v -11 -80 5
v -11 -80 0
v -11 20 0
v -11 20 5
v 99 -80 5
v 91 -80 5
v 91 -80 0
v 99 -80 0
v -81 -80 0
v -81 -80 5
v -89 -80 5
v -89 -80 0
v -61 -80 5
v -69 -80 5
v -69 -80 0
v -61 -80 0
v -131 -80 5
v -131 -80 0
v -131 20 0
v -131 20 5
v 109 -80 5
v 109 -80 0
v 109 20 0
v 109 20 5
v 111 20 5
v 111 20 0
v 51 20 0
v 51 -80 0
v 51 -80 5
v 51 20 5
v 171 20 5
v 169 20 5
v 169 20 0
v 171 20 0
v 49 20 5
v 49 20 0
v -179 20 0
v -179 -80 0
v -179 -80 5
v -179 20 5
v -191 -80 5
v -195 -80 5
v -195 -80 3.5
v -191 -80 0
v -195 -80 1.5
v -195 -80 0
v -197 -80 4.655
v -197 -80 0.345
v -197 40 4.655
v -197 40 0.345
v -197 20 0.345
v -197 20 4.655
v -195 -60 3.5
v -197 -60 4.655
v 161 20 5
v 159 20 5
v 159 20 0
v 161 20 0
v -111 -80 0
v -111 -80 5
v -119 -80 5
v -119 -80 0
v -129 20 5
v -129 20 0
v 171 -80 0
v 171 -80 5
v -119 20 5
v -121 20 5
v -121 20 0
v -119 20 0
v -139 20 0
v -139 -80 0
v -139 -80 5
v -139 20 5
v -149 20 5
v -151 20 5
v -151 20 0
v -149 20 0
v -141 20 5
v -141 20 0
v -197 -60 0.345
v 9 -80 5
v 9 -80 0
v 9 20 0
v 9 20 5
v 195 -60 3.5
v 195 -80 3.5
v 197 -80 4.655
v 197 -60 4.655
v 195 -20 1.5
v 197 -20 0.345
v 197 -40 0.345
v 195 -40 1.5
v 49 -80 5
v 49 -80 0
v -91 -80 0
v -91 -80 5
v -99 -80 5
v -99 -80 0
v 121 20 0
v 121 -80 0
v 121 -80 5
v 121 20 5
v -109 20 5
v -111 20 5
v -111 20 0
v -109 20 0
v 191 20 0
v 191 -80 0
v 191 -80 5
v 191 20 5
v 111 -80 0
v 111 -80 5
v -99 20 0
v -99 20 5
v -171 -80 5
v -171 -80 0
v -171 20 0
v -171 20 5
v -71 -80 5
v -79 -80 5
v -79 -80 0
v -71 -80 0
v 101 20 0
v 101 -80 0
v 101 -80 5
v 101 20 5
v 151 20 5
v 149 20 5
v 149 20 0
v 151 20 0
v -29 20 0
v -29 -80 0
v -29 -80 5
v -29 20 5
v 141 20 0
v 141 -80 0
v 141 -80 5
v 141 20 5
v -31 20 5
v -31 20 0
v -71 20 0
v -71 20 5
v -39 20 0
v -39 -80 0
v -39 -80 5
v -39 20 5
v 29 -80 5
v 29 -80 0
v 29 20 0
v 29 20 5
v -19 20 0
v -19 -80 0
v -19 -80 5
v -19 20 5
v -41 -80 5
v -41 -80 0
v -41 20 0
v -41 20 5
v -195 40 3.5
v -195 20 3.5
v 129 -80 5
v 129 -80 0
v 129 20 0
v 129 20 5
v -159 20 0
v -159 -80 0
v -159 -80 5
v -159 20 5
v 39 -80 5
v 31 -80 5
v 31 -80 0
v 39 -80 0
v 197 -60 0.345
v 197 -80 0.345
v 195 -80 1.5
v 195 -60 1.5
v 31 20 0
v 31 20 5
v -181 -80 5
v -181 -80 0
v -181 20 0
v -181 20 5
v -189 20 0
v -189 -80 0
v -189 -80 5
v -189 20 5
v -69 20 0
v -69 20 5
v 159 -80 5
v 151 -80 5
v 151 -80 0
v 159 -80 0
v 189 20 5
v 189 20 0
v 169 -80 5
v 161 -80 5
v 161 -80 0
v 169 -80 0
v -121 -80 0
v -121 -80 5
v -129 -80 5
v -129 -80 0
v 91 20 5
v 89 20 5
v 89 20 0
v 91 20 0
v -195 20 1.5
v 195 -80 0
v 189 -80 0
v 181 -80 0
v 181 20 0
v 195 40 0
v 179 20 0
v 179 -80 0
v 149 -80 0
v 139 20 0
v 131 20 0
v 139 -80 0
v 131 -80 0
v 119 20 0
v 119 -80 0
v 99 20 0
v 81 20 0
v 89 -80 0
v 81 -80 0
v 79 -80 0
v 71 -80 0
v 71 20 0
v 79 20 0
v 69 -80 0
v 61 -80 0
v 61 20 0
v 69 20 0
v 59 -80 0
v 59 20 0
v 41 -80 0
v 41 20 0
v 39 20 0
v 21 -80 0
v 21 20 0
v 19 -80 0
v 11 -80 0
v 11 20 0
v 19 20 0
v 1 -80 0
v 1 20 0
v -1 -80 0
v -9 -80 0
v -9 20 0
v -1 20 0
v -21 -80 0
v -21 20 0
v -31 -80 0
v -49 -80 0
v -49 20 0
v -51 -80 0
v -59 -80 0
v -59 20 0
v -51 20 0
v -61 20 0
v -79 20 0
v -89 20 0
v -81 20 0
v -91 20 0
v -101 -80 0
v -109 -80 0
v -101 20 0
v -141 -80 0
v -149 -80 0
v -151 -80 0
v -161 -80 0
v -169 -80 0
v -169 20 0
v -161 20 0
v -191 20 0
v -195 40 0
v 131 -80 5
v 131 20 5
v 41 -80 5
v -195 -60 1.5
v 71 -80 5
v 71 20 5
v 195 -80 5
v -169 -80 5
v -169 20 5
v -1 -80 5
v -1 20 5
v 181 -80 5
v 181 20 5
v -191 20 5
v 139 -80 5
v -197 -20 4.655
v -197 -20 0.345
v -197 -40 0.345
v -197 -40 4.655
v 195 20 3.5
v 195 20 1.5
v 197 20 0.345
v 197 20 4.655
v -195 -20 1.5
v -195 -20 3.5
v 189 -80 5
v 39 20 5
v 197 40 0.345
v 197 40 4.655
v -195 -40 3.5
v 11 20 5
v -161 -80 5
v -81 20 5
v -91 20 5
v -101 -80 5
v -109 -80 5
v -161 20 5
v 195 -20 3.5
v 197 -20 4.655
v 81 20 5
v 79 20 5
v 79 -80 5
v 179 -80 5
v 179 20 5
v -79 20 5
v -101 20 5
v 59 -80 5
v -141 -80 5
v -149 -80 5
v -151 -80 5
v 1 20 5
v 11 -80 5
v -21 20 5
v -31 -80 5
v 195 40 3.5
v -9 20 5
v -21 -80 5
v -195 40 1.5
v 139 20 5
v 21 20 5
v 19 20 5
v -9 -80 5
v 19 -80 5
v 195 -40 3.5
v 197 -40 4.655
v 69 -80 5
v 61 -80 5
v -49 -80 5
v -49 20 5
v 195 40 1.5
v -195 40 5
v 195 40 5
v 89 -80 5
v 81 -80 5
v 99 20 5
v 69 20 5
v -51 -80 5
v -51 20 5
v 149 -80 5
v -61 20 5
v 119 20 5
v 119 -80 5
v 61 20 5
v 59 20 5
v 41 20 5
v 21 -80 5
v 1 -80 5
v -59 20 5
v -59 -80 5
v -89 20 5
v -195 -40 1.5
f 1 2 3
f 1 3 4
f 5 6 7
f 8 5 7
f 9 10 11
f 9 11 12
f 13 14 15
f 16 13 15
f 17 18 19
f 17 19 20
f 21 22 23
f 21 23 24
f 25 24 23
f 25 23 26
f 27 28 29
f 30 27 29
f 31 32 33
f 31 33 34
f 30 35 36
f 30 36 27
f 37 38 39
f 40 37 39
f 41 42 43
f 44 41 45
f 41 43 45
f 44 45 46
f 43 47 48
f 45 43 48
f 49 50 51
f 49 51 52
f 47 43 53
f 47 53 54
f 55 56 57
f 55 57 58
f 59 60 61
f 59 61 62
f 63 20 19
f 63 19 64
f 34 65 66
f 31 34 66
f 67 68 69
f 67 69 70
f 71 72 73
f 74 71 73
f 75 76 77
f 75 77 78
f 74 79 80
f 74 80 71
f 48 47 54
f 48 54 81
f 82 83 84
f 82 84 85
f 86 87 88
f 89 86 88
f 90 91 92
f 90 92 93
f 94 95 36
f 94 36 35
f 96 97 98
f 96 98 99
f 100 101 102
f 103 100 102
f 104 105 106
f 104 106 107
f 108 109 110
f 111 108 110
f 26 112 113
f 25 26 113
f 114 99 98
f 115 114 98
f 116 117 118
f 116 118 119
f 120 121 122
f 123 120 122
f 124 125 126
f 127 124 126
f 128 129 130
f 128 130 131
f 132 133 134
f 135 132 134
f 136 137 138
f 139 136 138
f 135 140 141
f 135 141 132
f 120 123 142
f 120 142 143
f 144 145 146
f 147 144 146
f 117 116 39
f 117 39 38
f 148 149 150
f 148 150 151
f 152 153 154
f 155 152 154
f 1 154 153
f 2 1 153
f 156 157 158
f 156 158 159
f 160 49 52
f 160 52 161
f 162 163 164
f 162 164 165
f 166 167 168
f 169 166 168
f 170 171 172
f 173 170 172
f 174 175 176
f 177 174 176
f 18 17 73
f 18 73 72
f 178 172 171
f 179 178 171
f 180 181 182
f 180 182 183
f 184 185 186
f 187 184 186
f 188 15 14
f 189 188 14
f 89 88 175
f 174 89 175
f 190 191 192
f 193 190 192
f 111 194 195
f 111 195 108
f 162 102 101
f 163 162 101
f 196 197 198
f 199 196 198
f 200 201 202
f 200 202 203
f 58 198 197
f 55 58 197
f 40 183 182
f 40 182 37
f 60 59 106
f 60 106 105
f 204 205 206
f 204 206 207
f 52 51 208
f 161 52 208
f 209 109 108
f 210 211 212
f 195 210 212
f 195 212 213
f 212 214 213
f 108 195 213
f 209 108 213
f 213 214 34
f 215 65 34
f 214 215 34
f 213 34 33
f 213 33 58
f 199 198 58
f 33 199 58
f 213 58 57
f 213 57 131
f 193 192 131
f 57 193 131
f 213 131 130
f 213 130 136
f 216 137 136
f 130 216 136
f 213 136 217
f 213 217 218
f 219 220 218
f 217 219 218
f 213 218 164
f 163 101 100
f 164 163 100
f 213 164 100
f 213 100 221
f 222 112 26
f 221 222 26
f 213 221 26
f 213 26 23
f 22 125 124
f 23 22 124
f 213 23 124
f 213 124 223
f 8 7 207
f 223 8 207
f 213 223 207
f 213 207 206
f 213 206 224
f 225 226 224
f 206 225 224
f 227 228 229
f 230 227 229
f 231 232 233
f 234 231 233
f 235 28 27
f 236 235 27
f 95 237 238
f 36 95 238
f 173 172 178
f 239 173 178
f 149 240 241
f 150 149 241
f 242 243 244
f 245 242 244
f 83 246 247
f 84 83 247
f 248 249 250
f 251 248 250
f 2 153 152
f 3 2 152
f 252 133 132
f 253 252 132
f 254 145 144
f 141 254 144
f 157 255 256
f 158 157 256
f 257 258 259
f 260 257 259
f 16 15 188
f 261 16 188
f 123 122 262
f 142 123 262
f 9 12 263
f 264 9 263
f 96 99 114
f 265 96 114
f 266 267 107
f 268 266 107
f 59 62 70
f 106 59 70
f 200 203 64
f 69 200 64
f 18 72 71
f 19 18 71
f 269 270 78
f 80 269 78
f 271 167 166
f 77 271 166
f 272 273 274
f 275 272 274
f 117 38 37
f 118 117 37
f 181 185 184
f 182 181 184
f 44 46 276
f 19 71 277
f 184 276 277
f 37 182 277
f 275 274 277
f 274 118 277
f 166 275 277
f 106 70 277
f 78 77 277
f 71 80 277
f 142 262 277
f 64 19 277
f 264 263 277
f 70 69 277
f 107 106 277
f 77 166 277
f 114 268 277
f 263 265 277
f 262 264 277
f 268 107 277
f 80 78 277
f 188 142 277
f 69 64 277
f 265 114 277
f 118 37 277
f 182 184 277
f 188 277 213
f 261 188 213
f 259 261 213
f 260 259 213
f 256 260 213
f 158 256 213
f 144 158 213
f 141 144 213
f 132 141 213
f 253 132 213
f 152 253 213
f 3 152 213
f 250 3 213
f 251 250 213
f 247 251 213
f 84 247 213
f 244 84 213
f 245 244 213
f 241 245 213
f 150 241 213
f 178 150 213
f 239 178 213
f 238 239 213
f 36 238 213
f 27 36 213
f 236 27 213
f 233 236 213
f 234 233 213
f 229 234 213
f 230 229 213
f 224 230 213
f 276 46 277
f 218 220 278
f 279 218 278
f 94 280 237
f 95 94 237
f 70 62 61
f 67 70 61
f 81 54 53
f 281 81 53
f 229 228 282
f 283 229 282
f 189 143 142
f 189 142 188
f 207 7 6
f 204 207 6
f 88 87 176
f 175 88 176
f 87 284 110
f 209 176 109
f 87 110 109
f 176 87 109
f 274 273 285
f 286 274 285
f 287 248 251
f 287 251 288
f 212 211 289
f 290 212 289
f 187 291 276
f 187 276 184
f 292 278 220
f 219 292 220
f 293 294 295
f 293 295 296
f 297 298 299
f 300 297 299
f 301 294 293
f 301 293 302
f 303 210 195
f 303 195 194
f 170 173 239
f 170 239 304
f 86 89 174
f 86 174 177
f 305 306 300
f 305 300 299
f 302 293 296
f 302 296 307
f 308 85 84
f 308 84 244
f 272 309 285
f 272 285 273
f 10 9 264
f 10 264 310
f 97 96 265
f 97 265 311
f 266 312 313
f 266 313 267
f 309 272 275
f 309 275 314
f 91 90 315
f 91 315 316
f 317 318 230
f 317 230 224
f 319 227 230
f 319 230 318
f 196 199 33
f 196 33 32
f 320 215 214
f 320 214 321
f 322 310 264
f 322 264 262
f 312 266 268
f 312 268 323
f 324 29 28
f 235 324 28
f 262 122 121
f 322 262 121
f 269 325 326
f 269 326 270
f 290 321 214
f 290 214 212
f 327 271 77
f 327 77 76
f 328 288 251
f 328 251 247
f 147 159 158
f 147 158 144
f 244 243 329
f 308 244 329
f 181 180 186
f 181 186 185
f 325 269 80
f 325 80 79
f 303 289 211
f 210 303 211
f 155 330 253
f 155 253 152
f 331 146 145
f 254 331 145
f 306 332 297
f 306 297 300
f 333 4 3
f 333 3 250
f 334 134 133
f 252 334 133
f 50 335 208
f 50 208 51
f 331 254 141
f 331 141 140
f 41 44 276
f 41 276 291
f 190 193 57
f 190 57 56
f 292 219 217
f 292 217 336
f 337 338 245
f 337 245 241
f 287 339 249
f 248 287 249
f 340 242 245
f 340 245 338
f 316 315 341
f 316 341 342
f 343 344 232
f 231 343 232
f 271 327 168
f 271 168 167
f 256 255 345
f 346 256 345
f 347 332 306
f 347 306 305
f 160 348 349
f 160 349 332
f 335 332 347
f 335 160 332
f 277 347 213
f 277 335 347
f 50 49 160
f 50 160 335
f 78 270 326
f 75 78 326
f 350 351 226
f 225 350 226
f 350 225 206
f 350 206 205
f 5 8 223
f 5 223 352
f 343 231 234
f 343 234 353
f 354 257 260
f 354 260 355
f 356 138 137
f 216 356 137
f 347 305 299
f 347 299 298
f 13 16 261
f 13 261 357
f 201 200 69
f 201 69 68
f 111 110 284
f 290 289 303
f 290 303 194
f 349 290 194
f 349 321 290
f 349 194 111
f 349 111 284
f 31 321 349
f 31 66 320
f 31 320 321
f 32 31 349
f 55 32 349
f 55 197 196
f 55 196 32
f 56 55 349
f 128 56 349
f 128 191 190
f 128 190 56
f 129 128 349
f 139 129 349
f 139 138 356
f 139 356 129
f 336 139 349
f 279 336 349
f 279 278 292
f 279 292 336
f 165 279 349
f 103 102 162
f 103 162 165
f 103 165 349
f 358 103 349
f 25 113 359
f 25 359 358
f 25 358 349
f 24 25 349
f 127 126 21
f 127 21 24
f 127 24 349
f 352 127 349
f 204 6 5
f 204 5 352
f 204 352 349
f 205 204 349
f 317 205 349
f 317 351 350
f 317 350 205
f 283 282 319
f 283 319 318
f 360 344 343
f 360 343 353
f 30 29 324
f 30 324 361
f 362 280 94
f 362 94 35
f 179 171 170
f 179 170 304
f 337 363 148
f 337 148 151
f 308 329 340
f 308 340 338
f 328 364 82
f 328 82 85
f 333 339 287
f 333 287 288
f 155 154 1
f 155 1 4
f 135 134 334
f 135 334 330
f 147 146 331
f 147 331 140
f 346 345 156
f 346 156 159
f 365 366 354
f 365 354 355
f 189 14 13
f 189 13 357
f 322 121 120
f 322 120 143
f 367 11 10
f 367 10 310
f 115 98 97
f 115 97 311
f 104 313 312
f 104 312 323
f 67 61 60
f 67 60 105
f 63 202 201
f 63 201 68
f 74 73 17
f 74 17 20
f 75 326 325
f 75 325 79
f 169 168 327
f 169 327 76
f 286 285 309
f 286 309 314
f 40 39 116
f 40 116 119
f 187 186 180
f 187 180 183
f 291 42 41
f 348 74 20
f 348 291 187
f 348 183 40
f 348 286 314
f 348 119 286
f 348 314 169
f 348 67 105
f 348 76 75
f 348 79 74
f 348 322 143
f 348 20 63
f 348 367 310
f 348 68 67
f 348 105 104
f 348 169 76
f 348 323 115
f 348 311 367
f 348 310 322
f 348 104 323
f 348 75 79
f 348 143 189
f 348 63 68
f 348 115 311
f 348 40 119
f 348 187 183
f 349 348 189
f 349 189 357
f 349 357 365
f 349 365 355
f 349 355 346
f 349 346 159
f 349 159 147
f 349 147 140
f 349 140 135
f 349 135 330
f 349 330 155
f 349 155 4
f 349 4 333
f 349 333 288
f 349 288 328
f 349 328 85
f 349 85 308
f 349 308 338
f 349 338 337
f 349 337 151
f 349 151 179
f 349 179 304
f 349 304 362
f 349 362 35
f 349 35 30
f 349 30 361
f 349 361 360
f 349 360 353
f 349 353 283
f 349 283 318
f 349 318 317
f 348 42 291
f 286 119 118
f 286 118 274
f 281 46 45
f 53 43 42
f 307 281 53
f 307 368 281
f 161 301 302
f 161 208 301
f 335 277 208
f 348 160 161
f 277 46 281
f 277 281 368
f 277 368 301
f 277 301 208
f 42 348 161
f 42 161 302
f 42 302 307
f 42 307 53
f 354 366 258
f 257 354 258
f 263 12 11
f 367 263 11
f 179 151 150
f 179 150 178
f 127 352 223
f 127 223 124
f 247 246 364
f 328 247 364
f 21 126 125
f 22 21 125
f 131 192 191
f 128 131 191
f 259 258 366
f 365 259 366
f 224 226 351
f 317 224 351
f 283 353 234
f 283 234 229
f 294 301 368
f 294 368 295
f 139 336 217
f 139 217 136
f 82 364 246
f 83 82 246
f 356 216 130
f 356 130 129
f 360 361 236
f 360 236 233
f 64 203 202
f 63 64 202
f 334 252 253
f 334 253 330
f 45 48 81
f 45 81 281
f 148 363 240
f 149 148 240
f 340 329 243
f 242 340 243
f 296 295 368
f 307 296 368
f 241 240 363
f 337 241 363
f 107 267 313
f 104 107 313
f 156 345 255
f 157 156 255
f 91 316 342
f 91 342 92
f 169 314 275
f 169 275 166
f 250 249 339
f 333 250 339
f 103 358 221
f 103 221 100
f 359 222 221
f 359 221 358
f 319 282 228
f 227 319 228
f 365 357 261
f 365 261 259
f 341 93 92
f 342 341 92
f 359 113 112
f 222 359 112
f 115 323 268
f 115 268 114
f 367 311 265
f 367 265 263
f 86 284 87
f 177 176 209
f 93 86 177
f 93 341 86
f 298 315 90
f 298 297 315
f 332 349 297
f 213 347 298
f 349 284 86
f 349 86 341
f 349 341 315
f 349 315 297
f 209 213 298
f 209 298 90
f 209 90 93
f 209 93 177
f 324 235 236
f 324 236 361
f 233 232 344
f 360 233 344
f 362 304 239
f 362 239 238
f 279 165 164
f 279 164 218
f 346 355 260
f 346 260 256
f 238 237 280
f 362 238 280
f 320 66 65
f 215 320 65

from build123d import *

# Parameters (mm, degrees)
SKETCH_1_W          = 360
SKETCH_1_H          = 80
EXTRUDE_1_DEPTH     = 5
SKETCH_3_W          = 360
SKETCH_3_H          = 5
EXTRUDE_2_DEPTH     = 40
SKETCH_4_W          = 5
SKETCH_4_H          = 120
EXTRUDE_3_DEPTH     = 15
SKETCH_5_W          = 5
SKETCH_5_H          = 120
EXTRUDE_4_DEPTH     = 15
EXTRUDE_5_DEPTH     = 20
EXTRUDE_6_DEPTH     = 20
EXTRUDE_START       = -20
EXTRUDE_7_DEPTH     = 20
SKETCH_9_W          = 2
SKETCH_9_H          = 5
CUT_EXTRUDE_1_DEPTH = 100


with BuildPart() as part:
    # 草图1 → 凸台-拉伸1 (new body)
    with BuildSketch(Plane.XY):
        Rectangle(SKETCH_1_W, SKETCH_1_H)
    extrude(amount=EXTRUDE_1_DEPTH)

    # 草图3 → 凸台-拉伸2 (add)
    with BuildSketch(Plane.XZ.offset(40)):
        with Locations((0, 2.5)):
            Rectangle(SKETCH_3_W, SKETCH_3_H)
    extrude(amount=EXTRUDE_2_DEPTH)

    # 草图4 → 凸台-拉伸3 (add)
    with BuildSketch(Plane.ZY.offset(180)):
        with Locations((2.5, -20)):
            Rectangle(SKETCH_4_W, SKETCH_4_H)
    extrude(amount=EXTRUDE_3_DEPTH)

    # 草图5 → 凸台-拉伸4 (add)
    with BuildSketch(Plane(origin=(180, 0, 0), x_dir=(0, 0, -1), z_dir=(1, 0, 0))):
        with Locations((-2.5, -20)):
            Rectangle(SKETCH_5_W, SKETCH_5_H)
    extrude(amount=EXTRUDE_4_DEPTH)

    # 草图6 → 凸台-拉伸5 (add)
    with BuildSketch(Plane.XZ.offset(80)):
        Polygon((-195, 3.5), (-197, 4.654700538), (-197, 0.345299462), (-195, 1.5), align=None)
        Polygon((195, 1.5), (195, 3.5), (197, 4.654700538), (197, 0.345299462), align=None)
    extrude(amount=-EXTRUDE_5_DEPTH)

    # 草图7 → 凸台-拉伸6 (add)
    with BuildSketch(Plane(origin=(0, 40, 0), x_dir=(1, 0, 0), z_dir=(0, 1, 0))):
        Polygon((-195, -3.5), (-195, -1.5), (-197, -0.345299462), (-197, -4.654700538), align=None)
        Polygon((197, -0.345299462), (195, -1.5), (195, -3.5), (197, -4.654700538), align=None)
    extrude(amount=-EXTRUDE_6_DEPTH)

    # 草图8 → 凸台-拉伸7 (add)
    with BuildSketch(Plane(origin=(0, 0, 0), x_dir=(1, 0, 0), z_dir=(0, 1, 0)).offset(EXTRUDE_START)):
        Polygon((-195, -3.5), (-195, -1.5), (-197, -0.345299462), (-197, -4.654700538), align=None)
        Polygon((197, -0.345299462), (195, -1.5), (195, -3.5), (197, -4.654700538), align=None)
    extrude(amount=-EXTRUDE_7_DEPTH)

    # 草图9 → 切除-拉伸1 (cut)
    with BuildSketch(Plane.XZ.offset(80)):
        with Locations((10, 2.5)):
            Rectangle(SKETCH_9_W, SKETCH_9_H)
        with Locations((20, 2.5)):
            Rectangle(SKETCH_9_W, SKETCH_9_H)
        with Locations((0, 2.5)):
            Rectangle(SKETCH_9_W, SKETCH_9_H)
        with Locations((30, 2.5)):
            Rectangle(SKETCH_9_W, SKETCH_9_H)
        with Locations((40, 2.5)):
            Rectangle(SKETCH_9_W, SKETCH_9_H)
        with Locations((50, 2.5)):
            Rectangle(SKETCH_9_W, SKETCH_9_H)
        with Locations((60, 2.5)):
            Rectangle(SKETCH_9_W, SKETCH_9_H)
        with Locations((70, 2.5)):
            Rectangle(SKETCH_9_W, SKETCH_9_H)
        with Locations((80, 2.5)):
            Rectangle(SKETCH_9_W, SKETCH_9_H)
        with Locations((90, 2.5)):
            Rectangle(SKETCH_9_W, SKETCH_9_H)
        with Locations((100, 2.5)):
            Rectangle(SKETCH_9_W, SKETCH_9_H)
        with Locations((110, 2.5)):
            Rectangle(SKETCH_9_W, SKETCH_9_H)
        with Locations((120, 2.5)):
            Rectangle(SKETCH_9_W, SKETCH_9_H)
        with Locations((130, 2.5)):
            Rectangle(SKETCH_9_W, SKETCH_9_H)
        with Locations((140, 2.5)):
            Rectangle(SKETCH_9_W, SKETCH_9_H)
        with Locations((150, 2.5)):
            Rectangle(SKETCH_9_W, SKETCH_9_H)
        with Locations((160, 2.5)):
            Rectangle(SKETCH_9_W, SKETCH_9_H)
        with Locations((170, 2.5)):
            Rectangle(SKETCH_9_W, SKETCH_9_H)
        with Locations((180, 2.5)):
            Rectangle(SKETCH_9_W, SKETCH_9_H)
        with Locations((190, 2.5)):
            Rectangle(SKETCH_9_W, SKETCH_9_H)
        with Locations((-10, 2.5)):
            Rectangle(SKETCH_9_W, SKETCH_9_H)
        with Locations((-20, 2.5)):
            Rectangle(SKETCH_9_W, SKETCH_9_H)
        with Locations((-30, 2.5)):
            Rectangle(SKETCH_9_W, SKETCH_9_H)
        with Locations((-40, 2.5)):
            Rectangle(SKETCH_9_W, SKETCH_9_H)
        with Locations((-50, 2.5)):
            Rectangle(SKETCH_9_W, SKETCH_9_H)
        with Locations((-60, 2.5)):
            Rectangle(SKETCH_9_W, SKETCH_9_H)
        with Locations((-70, 2.5)):
            Rectangle(SKETCH_9_W, SKETCH_9_H)
        with Locations((-80, 2.5)):
            Rectangle(SKETCH_9_W, SKETCH_9_H)
        with Locations((-90, 2.5)):
            Rectangle(SKETCH_9_W, SKETCH_9_H)
        with Locations((-100, 2.5)):
            Rectangle(SKETCH_9_W, SKETCH_9_H)
        with Locations((-110, 2.5)):
            Rectangle(SKETCH_9_W, SKETCH_9_H)
        with Locations((-120, 2.5)):
            Rectangle(SKETCH_9_W, SKETCH_9_H)
        with Locations((-130, 2.5)):
            Rectangle(SKETCH_9_W, SKETCH_9_H)
        with Locations((-140, 2.5)):
            Rectangle(SKETCH_9_W, SKETCH_9_H)
        with Locations((-150, 2.5)):
            Rectangle(SKETCH_9_W, SKETCH_9_H)
        with Locations((-160, 2.5)):
            Rectangle(SKETCH_9_W, SKETCH_9_H)
        with Locations((-170, 2.5)):
            Rectangle(SKETCH_9_W, SKETCH_9_H)
        with Locations((-180, 2.5)):
            Rectangle(SKETCH_9_W, SKETCH_9_H)
        with Locations((-190, 2.5)):
            Rectangle(SKETCH_9_W, SKETCH_9_H)
    extrude(amount=-CUT_EXTRUDE_1_DEPTH, mode=Mode.SUBTRACT)


solid = part.part
